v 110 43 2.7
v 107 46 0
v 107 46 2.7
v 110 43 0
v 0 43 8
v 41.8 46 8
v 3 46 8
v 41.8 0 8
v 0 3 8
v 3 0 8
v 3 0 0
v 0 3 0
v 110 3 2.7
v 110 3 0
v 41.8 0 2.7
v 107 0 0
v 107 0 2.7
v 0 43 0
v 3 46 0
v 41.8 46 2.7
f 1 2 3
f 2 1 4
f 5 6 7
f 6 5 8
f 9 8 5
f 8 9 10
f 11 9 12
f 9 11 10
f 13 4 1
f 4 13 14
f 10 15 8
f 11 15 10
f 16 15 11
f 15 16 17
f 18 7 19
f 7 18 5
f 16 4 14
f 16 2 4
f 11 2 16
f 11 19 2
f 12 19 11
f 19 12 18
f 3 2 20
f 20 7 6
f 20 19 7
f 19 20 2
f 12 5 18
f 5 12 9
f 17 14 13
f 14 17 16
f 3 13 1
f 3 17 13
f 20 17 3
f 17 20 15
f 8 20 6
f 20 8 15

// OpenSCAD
$fn = 32;

// ----------------------------------------------------------------------
// Stepped bar: endstep, 110 x 46 x 8/2.7 mm
// ----------------------------------------------------------------------

// --- parameters (mm) ---
bar_l = 110;              // bar length, X
bar_w = 46;               // bar width, Y
plate_t = 8;              // thickness of the thick zone, Z
thin_t = 2.7;             // thickness of the thin zone
corner_c = 3;             // corner chamfer of the bar
step_cut = 5.3;           // material removed from the thin zone
step_x = 41.8;            // step position from the left end
depth_1 = 5.3;            // depth of cut 1 from the top face

profile = [[3, 0], [107, 0], [110, 3], [110, 43], [107, 46], [3, 46], [0, 43], [0, 3]];  // primary outline, 8 points, counter clockwise
void_1 = [[41.8, -1], [111, -1], [111, 47], [41.8, 47]];  // thin zone beyond the step, 4 points

// --- the one profile operation ---
difference() {
  linear_extrude(height = plate_t) polygon(points = profile);
  translate([0, 0, plate_t - depth_1])
    linear_extrude(height = depth_1 + 1) polygon(points = void_1);
}
